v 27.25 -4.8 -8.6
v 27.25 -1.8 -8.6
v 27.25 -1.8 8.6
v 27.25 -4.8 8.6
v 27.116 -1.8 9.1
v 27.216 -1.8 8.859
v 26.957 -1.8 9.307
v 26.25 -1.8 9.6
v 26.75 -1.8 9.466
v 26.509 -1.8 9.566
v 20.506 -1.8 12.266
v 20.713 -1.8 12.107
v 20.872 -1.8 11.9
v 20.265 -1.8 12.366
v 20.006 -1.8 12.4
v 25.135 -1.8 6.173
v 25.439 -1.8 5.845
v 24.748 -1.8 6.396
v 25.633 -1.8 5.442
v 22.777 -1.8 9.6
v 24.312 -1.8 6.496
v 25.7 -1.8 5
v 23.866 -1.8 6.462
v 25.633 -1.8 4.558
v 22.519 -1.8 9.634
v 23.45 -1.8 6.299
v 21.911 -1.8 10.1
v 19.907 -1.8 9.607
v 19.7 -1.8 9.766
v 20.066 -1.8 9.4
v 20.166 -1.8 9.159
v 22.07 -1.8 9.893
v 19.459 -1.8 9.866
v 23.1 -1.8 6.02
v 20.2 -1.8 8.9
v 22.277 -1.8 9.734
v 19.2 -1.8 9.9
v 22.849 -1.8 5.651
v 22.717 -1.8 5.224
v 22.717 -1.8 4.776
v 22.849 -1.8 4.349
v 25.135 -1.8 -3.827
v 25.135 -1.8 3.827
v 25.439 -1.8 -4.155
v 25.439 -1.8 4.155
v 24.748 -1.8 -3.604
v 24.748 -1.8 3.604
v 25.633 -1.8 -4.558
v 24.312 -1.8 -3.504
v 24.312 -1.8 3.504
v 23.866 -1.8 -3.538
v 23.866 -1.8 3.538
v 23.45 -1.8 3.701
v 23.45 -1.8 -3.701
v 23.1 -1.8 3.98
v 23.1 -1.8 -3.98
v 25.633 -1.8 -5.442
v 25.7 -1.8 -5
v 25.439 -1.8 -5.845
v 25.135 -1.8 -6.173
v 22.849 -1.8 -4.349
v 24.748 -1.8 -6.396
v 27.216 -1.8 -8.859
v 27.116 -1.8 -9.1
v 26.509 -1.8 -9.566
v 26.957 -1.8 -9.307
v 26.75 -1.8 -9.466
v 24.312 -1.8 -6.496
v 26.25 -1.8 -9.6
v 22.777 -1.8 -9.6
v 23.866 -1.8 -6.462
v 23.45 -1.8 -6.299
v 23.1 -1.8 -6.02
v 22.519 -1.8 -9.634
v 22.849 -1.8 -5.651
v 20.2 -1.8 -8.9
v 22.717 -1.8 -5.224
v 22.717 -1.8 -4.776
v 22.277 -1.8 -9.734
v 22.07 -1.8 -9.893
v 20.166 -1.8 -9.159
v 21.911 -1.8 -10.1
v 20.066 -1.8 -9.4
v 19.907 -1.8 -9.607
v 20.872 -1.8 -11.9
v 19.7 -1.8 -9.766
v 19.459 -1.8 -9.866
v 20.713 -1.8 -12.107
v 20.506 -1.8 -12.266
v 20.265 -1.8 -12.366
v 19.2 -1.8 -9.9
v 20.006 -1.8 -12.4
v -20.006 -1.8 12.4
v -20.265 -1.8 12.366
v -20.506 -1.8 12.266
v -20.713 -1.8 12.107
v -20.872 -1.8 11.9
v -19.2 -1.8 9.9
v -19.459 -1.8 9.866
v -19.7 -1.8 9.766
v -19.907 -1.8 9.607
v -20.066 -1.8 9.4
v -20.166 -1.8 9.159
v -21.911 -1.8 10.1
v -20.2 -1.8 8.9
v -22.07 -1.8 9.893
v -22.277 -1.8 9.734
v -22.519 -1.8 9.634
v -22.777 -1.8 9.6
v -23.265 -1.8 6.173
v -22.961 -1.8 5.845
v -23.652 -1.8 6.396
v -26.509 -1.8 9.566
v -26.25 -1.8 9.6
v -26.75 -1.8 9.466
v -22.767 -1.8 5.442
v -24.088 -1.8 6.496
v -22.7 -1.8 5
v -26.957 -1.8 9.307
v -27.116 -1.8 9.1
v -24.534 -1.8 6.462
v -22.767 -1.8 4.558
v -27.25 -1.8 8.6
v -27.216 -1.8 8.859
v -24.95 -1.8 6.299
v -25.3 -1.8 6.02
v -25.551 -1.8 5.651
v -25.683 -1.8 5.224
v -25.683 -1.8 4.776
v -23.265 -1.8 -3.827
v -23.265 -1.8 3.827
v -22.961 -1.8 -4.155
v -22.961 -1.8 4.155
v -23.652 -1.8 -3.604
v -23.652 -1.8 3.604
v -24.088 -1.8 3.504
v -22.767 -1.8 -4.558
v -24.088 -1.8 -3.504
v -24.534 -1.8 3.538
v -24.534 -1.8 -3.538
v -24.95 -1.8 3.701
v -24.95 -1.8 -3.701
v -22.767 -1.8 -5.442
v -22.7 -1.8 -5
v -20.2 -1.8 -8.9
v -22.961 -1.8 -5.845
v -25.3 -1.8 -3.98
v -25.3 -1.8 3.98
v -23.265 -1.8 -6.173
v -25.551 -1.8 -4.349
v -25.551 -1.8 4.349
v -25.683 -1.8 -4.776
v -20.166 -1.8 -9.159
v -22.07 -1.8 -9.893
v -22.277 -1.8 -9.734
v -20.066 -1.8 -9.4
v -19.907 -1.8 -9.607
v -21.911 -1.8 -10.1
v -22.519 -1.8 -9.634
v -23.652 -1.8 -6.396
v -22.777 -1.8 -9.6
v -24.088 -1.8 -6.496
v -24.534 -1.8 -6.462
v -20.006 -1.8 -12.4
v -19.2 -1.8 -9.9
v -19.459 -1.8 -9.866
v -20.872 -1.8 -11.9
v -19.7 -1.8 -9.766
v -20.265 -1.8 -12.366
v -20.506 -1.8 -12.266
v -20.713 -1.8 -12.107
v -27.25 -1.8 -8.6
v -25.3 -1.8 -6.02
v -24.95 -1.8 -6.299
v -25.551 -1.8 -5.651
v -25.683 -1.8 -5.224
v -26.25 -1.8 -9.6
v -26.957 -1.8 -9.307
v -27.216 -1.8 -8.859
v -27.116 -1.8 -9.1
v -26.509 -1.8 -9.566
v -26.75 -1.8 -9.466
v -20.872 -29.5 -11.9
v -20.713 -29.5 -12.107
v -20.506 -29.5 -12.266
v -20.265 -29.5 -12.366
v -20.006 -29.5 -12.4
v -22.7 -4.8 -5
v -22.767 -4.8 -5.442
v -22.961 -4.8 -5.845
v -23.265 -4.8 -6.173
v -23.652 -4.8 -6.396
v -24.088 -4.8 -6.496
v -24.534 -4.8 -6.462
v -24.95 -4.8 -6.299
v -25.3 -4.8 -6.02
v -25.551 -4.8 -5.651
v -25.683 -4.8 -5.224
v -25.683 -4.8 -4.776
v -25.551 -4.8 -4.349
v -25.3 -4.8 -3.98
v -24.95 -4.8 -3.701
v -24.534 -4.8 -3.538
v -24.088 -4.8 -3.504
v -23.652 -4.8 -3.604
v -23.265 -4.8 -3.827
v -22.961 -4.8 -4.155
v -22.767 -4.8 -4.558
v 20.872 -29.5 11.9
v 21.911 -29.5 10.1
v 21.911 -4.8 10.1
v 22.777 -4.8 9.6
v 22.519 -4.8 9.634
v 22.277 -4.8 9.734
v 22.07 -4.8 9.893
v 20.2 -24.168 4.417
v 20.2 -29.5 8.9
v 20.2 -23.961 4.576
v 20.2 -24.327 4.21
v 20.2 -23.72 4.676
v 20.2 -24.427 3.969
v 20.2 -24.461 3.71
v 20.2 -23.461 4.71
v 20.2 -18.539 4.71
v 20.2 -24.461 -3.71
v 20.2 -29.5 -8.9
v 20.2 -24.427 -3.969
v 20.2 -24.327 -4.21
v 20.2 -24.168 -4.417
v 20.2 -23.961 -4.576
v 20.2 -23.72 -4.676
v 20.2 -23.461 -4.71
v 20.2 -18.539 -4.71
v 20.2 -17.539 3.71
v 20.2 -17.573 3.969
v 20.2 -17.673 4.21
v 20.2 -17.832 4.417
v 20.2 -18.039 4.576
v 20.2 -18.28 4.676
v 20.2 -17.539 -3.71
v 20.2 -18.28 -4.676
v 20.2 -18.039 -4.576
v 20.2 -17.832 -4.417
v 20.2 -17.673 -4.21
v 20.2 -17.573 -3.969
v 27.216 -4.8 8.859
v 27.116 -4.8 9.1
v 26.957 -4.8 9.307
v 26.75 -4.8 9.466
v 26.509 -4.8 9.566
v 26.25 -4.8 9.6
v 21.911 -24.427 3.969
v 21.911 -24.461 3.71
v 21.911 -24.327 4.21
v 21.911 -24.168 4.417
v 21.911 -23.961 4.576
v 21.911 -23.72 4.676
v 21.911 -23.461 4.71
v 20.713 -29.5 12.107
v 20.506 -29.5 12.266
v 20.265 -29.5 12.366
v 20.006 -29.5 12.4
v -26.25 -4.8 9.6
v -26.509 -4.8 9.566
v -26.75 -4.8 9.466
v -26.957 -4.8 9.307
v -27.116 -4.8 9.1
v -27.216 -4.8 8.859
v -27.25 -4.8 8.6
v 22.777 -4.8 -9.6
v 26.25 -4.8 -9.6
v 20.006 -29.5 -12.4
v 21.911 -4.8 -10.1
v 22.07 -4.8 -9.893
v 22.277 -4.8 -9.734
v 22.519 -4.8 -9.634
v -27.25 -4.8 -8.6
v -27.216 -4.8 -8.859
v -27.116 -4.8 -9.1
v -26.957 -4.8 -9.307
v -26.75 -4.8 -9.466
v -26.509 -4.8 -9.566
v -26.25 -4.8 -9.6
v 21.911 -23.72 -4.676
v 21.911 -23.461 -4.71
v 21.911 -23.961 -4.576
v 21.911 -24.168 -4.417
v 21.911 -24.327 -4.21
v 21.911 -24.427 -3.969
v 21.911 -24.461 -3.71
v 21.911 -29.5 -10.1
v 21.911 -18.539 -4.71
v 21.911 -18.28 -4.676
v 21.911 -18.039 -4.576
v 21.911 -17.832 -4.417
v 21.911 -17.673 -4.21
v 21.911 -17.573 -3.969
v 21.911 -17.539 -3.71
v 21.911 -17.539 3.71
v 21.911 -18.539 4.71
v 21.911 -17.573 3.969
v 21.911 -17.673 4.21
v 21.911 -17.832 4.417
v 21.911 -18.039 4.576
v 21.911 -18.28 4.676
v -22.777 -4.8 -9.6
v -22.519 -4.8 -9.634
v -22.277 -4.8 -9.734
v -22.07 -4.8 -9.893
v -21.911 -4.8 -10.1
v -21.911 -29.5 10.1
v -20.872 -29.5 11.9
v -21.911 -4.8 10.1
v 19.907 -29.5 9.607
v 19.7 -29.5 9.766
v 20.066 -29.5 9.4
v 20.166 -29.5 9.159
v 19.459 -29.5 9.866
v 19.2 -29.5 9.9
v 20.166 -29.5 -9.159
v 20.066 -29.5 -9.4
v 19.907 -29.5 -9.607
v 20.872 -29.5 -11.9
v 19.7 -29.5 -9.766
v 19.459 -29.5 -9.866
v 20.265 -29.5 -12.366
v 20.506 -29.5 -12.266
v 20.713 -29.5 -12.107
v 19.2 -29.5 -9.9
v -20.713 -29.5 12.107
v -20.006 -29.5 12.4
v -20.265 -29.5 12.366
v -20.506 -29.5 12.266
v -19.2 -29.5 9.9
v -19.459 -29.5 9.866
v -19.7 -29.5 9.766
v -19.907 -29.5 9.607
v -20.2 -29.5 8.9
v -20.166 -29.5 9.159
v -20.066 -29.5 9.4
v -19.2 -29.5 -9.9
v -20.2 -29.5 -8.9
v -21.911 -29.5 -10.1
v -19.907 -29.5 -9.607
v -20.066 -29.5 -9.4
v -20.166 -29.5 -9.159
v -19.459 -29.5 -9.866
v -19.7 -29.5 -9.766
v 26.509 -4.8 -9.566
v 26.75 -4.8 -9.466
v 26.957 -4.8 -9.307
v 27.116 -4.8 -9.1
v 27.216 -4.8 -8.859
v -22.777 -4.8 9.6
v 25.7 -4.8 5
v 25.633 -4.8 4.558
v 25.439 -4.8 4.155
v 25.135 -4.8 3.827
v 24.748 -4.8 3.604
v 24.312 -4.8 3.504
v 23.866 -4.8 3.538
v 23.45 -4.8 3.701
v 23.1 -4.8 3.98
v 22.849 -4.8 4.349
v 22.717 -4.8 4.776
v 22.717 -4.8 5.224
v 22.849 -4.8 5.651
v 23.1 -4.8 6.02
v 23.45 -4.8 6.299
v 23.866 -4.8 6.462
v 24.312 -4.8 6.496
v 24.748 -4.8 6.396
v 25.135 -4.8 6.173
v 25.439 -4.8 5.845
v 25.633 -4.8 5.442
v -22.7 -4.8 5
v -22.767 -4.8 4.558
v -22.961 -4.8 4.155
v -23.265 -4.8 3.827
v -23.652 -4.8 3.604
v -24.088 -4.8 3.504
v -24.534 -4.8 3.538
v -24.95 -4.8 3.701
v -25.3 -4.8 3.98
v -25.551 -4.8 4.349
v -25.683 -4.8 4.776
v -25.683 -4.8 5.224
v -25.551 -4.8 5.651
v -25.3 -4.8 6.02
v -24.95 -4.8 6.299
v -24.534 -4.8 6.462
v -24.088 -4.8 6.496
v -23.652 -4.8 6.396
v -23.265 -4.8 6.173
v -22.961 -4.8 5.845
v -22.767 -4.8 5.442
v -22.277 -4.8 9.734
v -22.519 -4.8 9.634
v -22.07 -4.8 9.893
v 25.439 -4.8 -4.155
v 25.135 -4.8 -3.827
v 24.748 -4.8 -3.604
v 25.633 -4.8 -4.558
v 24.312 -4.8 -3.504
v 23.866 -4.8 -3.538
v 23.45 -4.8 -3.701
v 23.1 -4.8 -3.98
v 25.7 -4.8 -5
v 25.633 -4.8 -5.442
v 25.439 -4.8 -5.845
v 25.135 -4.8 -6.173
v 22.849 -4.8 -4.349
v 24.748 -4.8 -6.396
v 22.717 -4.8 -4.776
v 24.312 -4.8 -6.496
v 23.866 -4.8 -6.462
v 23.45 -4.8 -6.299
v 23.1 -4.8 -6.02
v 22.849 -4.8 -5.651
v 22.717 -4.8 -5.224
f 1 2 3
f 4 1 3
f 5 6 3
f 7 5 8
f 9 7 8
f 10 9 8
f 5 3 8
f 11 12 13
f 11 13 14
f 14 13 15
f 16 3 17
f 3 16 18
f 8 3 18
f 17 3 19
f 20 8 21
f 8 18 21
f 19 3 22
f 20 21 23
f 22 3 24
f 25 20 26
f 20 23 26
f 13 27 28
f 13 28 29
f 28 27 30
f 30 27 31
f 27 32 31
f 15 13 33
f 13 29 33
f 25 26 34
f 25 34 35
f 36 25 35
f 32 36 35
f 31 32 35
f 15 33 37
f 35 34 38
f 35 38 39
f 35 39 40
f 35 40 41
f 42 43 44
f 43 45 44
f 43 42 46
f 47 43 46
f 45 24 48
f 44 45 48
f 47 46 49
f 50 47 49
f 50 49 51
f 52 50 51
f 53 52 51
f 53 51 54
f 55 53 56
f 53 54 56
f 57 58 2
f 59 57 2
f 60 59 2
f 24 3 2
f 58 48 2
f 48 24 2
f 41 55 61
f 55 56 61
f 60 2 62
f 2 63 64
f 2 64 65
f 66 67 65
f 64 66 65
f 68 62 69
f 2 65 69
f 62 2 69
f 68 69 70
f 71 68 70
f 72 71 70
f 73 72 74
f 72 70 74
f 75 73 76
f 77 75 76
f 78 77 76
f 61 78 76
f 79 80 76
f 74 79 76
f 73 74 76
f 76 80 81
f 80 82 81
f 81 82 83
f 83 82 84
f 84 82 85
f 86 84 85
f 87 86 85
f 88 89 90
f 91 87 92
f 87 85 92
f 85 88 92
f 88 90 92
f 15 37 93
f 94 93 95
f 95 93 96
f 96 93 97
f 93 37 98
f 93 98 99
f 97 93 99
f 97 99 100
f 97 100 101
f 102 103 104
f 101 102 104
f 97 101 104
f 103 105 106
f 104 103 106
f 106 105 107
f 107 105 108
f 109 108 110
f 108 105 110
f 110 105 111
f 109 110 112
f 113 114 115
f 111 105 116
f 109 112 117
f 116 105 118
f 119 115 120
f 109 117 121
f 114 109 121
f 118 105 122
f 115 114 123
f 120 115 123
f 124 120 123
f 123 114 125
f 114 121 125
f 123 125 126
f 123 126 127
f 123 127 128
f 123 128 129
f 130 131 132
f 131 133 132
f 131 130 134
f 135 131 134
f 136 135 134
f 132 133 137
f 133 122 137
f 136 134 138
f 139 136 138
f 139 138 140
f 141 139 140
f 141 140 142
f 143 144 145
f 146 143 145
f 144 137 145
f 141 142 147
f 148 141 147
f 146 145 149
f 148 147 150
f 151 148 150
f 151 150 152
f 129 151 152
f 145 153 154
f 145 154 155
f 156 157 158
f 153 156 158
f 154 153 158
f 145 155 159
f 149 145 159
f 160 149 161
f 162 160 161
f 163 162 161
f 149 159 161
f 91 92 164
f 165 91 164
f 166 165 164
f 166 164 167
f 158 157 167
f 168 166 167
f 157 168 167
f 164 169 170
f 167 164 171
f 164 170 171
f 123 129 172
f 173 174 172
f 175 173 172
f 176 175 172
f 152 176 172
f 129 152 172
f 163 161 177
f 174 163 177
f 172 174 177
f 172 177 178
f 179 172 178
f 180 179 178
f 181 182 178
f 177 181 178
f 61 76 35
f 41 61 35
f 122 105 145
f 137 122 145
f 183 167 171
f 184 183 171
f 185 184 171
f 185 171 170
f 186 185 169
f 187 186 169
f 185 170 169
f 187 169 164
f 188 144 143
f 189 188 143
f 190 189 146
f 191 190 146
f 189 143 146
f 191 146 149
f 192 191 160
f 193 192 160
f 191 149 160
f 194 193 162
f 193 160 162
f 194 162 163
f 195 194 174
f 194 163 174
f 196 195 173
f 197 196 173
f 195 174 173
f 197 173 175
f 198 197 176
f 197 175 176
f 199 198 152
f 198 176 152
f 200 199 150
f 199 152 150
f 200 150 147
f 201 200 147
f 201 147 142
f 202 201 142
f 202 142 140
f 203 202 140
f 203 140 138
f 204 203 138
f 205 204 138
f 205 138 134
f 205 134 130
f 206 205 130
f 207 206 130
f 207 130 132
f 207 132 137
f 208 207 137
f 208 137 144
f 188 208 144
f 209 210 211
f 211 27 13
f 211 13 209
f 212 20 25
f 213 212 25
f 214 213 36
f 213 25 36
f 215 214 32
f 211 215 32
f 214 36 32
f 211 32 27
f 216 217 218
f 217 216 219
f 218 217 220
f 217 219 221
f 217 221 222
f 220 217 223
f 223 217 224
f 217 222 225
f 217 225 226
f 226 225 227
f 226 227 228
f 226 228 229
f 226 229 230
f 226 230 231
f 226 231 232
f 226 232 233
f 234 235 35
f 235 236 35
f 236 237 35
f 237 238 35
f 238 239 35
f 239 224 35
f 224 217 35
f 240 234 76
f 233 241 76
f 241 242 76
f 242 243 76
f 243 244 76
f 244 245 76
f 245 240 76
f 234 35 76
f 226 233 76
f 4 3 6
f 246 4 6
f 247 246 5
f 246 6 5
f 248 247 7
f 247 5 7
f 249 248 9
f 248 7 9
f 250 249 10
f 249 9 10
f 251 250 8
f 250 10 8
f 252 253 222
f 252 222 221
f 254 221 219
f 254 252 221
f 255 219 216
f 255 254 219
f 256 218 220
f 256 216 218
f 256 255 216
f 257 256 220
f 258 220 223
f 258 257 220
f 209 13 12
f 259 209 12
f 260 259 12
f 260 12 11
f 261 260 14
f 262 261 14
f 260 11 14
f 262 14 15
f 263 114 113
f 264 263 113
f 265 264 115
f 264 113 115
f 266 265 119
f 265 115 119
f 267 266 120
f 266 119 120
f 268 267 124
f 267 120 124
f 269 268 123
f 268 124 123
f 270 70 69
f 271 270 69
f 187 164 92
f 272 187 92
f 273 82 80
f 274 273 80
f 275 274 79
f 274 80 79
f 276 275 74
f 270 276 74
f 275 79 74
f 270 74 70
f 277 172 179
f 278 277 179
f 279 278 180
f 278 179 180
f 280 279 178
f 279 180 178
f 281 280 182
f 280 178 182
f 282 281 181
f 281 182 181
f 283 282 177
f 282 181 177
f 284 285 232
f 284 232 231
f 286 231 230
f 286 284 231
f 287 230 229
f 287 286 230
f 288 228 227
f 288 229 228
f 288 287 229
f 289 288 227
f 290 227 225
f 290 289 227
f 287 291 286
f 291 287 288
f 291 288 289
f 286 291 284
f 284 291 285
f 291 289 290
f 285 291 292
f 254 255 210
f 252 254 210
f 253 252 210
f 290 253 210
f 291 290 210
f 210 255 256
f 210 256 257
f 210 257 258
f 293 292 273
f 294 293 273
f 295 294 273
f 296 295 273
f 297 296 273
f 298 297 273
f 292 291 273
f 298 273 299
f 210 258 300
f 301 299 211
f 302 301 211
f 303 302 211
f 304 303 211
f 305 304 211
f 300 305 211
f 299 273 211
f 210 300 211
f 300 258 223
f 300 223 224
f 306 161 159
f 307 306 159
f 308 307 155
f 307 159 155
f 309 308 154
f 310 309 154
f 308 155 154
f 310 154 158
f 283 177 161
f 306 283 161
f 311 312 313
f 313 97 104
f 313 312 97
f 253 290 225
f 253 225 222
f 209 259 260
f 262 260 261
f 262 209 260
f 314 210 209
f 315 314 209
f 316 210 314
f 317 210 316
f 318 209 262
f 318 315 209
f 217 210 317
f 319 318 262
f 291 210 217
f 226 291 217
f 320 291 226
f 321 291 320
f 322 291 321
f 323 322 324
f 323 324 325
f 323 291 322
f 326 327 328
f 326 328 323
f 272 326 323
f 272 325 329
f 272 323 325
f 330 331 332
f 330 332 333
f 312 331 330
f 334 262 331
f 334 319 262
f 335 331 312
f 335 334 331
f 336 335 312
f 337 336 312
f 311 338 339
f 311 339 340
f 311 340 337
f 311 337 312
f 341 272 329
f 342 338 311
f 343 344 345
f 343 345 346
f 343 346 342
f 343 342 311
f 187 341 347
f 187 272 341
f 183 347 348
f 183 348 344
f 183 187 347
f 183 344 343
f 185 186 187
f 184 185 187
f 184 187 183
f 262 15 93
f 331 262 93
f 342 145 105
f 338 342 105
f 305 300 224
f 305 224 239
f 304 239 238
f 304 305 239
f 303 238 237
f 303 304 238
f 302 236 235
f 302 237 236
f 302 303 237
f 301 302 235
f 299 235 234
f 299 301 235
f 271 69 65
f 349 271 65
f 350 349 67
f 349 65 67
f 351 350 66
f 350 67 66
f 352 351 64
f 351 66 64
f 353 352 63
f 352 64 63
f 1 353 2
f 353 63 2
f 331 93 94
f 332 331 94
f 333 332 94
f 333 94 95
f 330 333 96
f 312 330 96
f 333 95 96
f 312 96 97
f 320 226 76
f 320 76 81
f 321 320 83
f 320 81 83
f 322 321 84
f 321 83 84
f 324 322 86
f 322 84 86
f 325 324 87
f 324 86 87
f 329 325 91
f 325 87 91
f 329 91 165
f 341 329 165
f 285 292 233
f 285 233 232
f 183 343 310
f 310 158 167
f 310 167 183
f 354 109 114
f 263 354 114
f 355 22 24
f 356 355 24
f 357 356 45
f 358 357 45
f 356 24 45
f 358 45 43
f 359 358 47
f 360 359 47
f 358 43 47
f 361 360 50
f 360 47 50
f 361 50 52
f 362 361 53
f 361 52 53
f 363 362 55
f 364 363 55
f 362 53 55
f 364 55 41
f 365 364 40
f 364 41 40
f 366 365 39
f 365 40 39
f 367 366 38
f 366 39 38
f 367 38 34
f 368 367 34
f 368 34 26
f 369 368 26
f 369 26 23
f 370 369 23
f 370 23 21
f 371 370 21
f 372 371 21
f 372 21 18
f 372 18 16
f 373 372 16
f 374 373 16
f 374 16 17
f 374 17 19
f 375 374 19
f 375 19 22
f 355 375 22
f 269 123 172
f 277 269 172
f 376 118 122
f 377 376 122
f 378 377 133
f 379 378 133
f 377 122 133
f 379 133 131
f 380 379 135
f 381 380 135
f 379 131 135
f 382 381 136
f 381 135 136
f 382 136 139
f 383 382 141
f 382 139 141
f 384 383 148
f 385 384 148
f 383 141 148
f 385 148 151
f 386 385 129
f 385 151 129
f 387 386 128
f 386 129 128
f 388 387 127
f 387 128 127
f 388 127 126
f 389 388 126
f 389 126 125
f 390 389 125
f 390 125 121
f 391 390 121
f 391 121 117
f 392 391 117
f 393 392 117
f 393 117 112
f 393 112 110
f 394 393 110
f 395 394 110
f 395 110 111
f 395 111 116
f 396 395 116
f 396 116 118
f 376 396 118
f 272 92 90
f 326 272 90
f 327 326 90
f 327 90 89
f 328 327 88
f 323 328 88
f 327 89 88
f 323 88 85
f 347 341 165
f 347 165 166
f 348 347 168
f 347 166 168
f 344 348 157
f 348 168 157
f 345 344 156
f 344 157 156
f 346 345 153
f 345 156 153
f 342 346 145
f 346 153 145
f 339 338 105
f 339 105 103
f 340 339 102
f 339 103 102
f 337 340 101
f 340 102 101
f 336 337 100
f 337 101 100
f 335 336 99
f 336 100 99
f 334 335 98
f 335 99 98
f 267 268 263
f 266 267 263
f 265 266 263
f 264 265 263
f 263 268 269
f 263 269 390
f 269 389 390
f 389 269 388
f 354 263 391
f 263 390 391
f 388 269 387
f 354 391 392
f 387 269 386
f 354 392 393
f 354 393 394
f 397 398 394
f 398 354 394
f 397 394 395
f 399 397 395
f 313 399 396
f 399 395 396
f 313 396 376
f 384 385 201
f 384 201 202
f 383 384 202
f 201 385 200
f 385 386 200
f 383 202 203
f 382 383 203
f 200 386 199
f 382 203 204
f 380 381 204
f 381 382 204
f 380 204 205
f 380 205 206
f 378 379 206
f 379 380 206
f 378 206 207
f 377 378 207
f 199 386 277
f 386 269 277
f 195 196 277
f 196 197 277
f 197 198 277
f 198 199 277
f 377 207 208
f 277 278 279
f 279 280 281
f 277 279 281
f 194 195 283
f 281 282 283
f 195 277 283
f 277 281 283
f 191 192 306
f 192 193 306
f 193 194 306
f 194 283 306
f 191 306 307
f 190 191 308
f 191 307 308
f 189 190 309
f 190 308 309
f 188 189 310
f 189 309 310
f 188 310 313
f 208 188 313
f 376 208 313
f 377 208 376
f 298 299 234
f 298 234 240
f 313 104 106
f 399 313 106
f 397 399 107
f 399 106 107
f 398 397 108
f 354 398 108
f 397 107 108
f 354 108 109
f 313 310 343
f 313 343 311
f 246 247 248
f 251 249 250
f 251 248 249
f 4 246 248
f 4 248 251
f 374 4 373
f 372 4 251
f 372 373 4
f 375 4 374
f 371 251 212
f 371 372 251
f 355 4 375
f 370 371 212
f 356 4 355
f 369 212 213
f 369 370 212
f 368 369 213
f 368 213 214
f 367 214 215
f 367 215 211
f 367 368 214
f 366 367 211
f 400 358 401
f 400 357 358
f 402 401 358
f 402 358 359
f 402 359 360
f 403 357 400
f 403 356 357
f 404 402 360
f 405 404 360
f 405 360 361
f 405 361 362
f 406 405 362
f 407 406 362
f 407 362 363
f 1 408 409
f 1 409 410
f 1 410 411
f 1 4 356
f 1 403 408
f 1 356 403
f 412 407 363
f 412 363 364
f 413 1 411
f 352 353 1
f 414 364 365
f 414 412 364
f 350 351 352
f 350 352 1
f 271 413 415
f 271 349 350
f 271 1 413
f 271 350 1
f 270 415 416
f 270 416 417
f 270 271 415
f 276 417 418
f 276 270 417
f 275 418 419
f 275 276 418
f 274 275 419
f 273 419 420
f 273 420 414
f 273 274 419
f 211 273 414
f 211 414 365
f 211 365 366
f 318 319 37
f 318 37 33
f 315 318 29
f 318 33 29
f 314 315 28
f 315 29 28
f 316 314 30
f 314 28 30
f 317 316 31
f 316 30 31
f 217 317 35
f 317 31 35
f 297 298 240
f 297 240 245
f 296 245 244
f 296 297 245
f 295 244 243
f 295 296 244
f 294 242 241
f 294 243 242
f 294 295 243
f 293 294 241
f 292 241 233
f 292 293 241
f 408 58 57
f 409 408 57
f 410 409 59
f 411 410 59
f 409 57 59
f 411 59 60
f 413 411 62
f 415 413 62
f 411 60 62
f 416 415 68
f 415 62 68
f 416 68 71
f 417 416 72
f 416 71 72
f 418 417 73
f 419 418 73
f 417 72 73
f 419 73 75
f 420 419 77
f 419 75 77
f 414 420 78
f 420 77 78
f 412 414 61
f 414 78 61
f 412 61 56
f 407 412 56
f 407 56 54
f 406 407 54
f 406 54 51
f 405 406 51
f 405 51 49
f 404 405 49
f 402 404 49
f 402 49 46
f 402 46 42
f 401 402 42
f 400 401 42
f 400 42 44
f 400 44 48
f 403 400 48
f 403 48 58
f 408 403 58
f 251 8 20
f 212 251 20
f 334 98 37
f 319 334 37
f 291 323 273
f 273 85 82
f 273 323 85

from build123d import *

# Parameters (mm, degrees)
SCHIZZO3_R                   = 1.5
ESTRUSIONE_ESTRUSIONE2_DEPTH = 27.7
TAGLIO_ESTRUSIONE1_REACH     = 56.5
TAGLIO_ESTRUSIONE2_START     = -3
TAGLIO_ESTRUSIONE2_DEPTH     = 24.7


with BuildPart() as part:
    # Schizzo3 → Estrusione-Estrusione2 (new body)
    with BuildSketch(Plane(origin=(0, -1.8, 0), x_dir=(1, 0, 0), z_dir=(0, 1, 0))):
        with BuildLine():
            Line((27.25, -1.6), (27.25, -8.6))
            ThreePointArc((27.25, -8.6), (26.957106781, -9.307106781), (26.25, -9.6))
            Line((26.25, -9.6), (22.777350269, -9.6))
            ThreePointArc((22.777350269, -9.6), (22.277350269, -9.733974596), (21.911324865, -10.1))
            Line((21.911324865, -10.1), (20.872094381, -11.9))
            ThreePointArc((20.872094381, -11.9), (20.506068977, -12.266025404), (20.006068977, -12.4))
            Line((20.006068977, -12.4), (-20.006068977, -12.4))
            ThreePointArc((-20.006068977, -12.4), (-20.506068977, -12.266025404), (-20.872094381, -11.9))
            Line((-20.872094381, -11.9), (-21.911324865, -10.1))
            ThreePointArc((-21.911324865, -10.1), (-22.277350269, -9.733974596), (-22.777350269, -9.6))
            Line((-22.777350269, -9.6), (-26.25, -9.6))
            ThreePointArc((-26.25, -9.6), (-26.957106781, -9.307106781), (-27.25, -8.6))
            Line((-27.25, -8.6), (-27.25, -1.6))
            Line((-27.25, -1.6), (-27.25, 1.6))
            Line((-27.25, 1.6), (-27.25, 8.6))
            ThreePointArc((-27.25, 8.6), (-26.957106781, 9.307106781), (-26.25, 9.6))
            Line((-26.25, 9.6), (-22.777350269, 9.6))
            ThreePointArc((-22.777350269, 9.6), (-22.277350269, 9.733974596), (-21.911324865, 10.1))
            Line((-21.911324865, 10.1), (-20.872094381, 11.9))
            ThreePointArc((-20.872094381, 11.9), (-20.506068977, 12.266025404), (-20.006068977, 12.4))
            Line((-20.006068977, 12.4), (20.006068977, 12.4))
            ThreePointArc((20.006068977, 12.4), (20.506068977, 12.266025404), (20.872094381, 11.9))
            Line((20.872094381, 11.9), (21.911324865, 10.1))
            ThreePointArc((21.911324865, 10.1), (22.277350269, 9.733974596), (22.777350269, 9.6))
            Line((22.777350269, 9.6), (26.25, 9.6))
            ThreePointArc((26.25, 9.6), (26.957106781, 9.307106781), (27.25, 8.6))
            Line((27.25, 8.6), (27.25, 1.6))
            Line((27.25, 1.6), (27.25, -1.6))
        make_face()
        with Locations((24.2, -5)):
            Circle(SCHIZZO3_R, mode=Mode.SUBTRACT)
        with Locations((24.2, 5)):
            Circle(SCHIZZO3_R, mode=Mode.SUBTRACT)
        with Locations((-24.2, 5)):
            Circle(SCHIZZO3_R, mode=Mode.SUBTRACT)
        with Locations((-24.2, -5)):
            Circle(SCHIZZO3_R, mode=Mode.SUBTRACT)
        with BuildLine():
            Line((-19.2, -9.9), (19.2, -9.9))
            ThreePointArc((19.2, -9.9), (19.907106781, -9.607106781), (20.2, -8.9))
            Line((20.2, -8.9), (20.2, 8.9))
            ThreePointArc((20.2, 8.9), (19.907106781, 9.607106781), (19.2, 9.9))
            Line((19.2, 9.9), (-19.2, 9.9))
            ThreePointArc((-19.2, 9.9), (-19.907106781, 9.607106781), (-20.2, 8.9))
            Line((-20.2, 8.9), (-20.2, -8.9))
            ThreePointArc((-20.2, -8.9), (-19.907106781, -9.607106781), (-19.2, -9.9))
        make_face(mode=Mode.SUBTRACT)
    extrude(amount=-ESTRUSIONE_ESTRUSIONE2_DEPTH)

    # Schizzo4 → Taglio-Estrusione1 (cut, up to next)
    with BuildSketch(Plane(origin=(27.25, 0, 0), x_dir=(0, 0, -1), z_dir=(1, 0, 0)), mode=Mode.PRIVATE) as taglio_estrusione1_sk1:
        with BuildLine():
            Line((-3.710237866, -17.5387571), (3.710237866, -17.5387571))
            ThreePointArc((3.710237866, -17.5387571), (4.417344647, -17.831650319), (4.710237866, -18.5387571))
            Line((4.710237866, -18.5387571), (4.710237866, -23.4612429))
            ThreePointArc((4.710237866, -23.4612429), (4.417344647, -24.168349681), (3.710237866, -24.4612429))
            Line((3.710237866, -24.4612429), (-3.710237866, -24.4612429))
            ThreePointArc((-3.710237866, -24.4612429), (-4.417344647, -24.168349681), (-4.710237866, -23.4612429))
            Line((-4.710237866, -23.4612429), (-4.710237866, -18.5387571))
            ThreePointArc((-4.710237866, -18.5387571), (-4.417344647, -17.831650319), (-3.710237866, -17.5387571))
        make_face()
    taglio_estrusione1_tool1 = extrude(taglio_estrusione1_sk1.sketch, amount=-TAGLIO_ESTRUSIONE1_REACH, mode=Mode.PRIVATE) & part.part
    add(taglio_estrusione1_tool1.solids().sort_by_distance((27.25, -21, 0))[0], mode=Mode.SUBTRACT)

    # Schizzo5 → Taglio-Estrusione2 (cut)
    with BuildSketch(Plane(origin=(0, -1.8, 0), x_dir=(1, 0, 0), z_dir=(0, 1, 0)).offset(TAGLIO_ESTRUSIONE2_START)):
        Polygon((27.25, 8.6), (27.25, -8.6), (27.507432363, -11.370727038), (21.911324865, -11.370727038), (21.911324865, -9.6), (21.911324865, 9.6), (21.911324865, 11.665734377), (27.25, 11.503675338), align=None)
    taglio_estrusione2 = extrude(amount=-TAGLIO_ESTRUSIONE2_DEPTH, mode=Mode.SUBTRACT)

    # Specchia1: Taglio-Estrusione2 across plane
    add(taglio_estrusione2.mirror(Plane(origin=(0, 0, 0), x_dir=(0, 0, 1), z_dir=(1, 0, 0))), mode=Mode.SUBTRACT)


solid = part.part
